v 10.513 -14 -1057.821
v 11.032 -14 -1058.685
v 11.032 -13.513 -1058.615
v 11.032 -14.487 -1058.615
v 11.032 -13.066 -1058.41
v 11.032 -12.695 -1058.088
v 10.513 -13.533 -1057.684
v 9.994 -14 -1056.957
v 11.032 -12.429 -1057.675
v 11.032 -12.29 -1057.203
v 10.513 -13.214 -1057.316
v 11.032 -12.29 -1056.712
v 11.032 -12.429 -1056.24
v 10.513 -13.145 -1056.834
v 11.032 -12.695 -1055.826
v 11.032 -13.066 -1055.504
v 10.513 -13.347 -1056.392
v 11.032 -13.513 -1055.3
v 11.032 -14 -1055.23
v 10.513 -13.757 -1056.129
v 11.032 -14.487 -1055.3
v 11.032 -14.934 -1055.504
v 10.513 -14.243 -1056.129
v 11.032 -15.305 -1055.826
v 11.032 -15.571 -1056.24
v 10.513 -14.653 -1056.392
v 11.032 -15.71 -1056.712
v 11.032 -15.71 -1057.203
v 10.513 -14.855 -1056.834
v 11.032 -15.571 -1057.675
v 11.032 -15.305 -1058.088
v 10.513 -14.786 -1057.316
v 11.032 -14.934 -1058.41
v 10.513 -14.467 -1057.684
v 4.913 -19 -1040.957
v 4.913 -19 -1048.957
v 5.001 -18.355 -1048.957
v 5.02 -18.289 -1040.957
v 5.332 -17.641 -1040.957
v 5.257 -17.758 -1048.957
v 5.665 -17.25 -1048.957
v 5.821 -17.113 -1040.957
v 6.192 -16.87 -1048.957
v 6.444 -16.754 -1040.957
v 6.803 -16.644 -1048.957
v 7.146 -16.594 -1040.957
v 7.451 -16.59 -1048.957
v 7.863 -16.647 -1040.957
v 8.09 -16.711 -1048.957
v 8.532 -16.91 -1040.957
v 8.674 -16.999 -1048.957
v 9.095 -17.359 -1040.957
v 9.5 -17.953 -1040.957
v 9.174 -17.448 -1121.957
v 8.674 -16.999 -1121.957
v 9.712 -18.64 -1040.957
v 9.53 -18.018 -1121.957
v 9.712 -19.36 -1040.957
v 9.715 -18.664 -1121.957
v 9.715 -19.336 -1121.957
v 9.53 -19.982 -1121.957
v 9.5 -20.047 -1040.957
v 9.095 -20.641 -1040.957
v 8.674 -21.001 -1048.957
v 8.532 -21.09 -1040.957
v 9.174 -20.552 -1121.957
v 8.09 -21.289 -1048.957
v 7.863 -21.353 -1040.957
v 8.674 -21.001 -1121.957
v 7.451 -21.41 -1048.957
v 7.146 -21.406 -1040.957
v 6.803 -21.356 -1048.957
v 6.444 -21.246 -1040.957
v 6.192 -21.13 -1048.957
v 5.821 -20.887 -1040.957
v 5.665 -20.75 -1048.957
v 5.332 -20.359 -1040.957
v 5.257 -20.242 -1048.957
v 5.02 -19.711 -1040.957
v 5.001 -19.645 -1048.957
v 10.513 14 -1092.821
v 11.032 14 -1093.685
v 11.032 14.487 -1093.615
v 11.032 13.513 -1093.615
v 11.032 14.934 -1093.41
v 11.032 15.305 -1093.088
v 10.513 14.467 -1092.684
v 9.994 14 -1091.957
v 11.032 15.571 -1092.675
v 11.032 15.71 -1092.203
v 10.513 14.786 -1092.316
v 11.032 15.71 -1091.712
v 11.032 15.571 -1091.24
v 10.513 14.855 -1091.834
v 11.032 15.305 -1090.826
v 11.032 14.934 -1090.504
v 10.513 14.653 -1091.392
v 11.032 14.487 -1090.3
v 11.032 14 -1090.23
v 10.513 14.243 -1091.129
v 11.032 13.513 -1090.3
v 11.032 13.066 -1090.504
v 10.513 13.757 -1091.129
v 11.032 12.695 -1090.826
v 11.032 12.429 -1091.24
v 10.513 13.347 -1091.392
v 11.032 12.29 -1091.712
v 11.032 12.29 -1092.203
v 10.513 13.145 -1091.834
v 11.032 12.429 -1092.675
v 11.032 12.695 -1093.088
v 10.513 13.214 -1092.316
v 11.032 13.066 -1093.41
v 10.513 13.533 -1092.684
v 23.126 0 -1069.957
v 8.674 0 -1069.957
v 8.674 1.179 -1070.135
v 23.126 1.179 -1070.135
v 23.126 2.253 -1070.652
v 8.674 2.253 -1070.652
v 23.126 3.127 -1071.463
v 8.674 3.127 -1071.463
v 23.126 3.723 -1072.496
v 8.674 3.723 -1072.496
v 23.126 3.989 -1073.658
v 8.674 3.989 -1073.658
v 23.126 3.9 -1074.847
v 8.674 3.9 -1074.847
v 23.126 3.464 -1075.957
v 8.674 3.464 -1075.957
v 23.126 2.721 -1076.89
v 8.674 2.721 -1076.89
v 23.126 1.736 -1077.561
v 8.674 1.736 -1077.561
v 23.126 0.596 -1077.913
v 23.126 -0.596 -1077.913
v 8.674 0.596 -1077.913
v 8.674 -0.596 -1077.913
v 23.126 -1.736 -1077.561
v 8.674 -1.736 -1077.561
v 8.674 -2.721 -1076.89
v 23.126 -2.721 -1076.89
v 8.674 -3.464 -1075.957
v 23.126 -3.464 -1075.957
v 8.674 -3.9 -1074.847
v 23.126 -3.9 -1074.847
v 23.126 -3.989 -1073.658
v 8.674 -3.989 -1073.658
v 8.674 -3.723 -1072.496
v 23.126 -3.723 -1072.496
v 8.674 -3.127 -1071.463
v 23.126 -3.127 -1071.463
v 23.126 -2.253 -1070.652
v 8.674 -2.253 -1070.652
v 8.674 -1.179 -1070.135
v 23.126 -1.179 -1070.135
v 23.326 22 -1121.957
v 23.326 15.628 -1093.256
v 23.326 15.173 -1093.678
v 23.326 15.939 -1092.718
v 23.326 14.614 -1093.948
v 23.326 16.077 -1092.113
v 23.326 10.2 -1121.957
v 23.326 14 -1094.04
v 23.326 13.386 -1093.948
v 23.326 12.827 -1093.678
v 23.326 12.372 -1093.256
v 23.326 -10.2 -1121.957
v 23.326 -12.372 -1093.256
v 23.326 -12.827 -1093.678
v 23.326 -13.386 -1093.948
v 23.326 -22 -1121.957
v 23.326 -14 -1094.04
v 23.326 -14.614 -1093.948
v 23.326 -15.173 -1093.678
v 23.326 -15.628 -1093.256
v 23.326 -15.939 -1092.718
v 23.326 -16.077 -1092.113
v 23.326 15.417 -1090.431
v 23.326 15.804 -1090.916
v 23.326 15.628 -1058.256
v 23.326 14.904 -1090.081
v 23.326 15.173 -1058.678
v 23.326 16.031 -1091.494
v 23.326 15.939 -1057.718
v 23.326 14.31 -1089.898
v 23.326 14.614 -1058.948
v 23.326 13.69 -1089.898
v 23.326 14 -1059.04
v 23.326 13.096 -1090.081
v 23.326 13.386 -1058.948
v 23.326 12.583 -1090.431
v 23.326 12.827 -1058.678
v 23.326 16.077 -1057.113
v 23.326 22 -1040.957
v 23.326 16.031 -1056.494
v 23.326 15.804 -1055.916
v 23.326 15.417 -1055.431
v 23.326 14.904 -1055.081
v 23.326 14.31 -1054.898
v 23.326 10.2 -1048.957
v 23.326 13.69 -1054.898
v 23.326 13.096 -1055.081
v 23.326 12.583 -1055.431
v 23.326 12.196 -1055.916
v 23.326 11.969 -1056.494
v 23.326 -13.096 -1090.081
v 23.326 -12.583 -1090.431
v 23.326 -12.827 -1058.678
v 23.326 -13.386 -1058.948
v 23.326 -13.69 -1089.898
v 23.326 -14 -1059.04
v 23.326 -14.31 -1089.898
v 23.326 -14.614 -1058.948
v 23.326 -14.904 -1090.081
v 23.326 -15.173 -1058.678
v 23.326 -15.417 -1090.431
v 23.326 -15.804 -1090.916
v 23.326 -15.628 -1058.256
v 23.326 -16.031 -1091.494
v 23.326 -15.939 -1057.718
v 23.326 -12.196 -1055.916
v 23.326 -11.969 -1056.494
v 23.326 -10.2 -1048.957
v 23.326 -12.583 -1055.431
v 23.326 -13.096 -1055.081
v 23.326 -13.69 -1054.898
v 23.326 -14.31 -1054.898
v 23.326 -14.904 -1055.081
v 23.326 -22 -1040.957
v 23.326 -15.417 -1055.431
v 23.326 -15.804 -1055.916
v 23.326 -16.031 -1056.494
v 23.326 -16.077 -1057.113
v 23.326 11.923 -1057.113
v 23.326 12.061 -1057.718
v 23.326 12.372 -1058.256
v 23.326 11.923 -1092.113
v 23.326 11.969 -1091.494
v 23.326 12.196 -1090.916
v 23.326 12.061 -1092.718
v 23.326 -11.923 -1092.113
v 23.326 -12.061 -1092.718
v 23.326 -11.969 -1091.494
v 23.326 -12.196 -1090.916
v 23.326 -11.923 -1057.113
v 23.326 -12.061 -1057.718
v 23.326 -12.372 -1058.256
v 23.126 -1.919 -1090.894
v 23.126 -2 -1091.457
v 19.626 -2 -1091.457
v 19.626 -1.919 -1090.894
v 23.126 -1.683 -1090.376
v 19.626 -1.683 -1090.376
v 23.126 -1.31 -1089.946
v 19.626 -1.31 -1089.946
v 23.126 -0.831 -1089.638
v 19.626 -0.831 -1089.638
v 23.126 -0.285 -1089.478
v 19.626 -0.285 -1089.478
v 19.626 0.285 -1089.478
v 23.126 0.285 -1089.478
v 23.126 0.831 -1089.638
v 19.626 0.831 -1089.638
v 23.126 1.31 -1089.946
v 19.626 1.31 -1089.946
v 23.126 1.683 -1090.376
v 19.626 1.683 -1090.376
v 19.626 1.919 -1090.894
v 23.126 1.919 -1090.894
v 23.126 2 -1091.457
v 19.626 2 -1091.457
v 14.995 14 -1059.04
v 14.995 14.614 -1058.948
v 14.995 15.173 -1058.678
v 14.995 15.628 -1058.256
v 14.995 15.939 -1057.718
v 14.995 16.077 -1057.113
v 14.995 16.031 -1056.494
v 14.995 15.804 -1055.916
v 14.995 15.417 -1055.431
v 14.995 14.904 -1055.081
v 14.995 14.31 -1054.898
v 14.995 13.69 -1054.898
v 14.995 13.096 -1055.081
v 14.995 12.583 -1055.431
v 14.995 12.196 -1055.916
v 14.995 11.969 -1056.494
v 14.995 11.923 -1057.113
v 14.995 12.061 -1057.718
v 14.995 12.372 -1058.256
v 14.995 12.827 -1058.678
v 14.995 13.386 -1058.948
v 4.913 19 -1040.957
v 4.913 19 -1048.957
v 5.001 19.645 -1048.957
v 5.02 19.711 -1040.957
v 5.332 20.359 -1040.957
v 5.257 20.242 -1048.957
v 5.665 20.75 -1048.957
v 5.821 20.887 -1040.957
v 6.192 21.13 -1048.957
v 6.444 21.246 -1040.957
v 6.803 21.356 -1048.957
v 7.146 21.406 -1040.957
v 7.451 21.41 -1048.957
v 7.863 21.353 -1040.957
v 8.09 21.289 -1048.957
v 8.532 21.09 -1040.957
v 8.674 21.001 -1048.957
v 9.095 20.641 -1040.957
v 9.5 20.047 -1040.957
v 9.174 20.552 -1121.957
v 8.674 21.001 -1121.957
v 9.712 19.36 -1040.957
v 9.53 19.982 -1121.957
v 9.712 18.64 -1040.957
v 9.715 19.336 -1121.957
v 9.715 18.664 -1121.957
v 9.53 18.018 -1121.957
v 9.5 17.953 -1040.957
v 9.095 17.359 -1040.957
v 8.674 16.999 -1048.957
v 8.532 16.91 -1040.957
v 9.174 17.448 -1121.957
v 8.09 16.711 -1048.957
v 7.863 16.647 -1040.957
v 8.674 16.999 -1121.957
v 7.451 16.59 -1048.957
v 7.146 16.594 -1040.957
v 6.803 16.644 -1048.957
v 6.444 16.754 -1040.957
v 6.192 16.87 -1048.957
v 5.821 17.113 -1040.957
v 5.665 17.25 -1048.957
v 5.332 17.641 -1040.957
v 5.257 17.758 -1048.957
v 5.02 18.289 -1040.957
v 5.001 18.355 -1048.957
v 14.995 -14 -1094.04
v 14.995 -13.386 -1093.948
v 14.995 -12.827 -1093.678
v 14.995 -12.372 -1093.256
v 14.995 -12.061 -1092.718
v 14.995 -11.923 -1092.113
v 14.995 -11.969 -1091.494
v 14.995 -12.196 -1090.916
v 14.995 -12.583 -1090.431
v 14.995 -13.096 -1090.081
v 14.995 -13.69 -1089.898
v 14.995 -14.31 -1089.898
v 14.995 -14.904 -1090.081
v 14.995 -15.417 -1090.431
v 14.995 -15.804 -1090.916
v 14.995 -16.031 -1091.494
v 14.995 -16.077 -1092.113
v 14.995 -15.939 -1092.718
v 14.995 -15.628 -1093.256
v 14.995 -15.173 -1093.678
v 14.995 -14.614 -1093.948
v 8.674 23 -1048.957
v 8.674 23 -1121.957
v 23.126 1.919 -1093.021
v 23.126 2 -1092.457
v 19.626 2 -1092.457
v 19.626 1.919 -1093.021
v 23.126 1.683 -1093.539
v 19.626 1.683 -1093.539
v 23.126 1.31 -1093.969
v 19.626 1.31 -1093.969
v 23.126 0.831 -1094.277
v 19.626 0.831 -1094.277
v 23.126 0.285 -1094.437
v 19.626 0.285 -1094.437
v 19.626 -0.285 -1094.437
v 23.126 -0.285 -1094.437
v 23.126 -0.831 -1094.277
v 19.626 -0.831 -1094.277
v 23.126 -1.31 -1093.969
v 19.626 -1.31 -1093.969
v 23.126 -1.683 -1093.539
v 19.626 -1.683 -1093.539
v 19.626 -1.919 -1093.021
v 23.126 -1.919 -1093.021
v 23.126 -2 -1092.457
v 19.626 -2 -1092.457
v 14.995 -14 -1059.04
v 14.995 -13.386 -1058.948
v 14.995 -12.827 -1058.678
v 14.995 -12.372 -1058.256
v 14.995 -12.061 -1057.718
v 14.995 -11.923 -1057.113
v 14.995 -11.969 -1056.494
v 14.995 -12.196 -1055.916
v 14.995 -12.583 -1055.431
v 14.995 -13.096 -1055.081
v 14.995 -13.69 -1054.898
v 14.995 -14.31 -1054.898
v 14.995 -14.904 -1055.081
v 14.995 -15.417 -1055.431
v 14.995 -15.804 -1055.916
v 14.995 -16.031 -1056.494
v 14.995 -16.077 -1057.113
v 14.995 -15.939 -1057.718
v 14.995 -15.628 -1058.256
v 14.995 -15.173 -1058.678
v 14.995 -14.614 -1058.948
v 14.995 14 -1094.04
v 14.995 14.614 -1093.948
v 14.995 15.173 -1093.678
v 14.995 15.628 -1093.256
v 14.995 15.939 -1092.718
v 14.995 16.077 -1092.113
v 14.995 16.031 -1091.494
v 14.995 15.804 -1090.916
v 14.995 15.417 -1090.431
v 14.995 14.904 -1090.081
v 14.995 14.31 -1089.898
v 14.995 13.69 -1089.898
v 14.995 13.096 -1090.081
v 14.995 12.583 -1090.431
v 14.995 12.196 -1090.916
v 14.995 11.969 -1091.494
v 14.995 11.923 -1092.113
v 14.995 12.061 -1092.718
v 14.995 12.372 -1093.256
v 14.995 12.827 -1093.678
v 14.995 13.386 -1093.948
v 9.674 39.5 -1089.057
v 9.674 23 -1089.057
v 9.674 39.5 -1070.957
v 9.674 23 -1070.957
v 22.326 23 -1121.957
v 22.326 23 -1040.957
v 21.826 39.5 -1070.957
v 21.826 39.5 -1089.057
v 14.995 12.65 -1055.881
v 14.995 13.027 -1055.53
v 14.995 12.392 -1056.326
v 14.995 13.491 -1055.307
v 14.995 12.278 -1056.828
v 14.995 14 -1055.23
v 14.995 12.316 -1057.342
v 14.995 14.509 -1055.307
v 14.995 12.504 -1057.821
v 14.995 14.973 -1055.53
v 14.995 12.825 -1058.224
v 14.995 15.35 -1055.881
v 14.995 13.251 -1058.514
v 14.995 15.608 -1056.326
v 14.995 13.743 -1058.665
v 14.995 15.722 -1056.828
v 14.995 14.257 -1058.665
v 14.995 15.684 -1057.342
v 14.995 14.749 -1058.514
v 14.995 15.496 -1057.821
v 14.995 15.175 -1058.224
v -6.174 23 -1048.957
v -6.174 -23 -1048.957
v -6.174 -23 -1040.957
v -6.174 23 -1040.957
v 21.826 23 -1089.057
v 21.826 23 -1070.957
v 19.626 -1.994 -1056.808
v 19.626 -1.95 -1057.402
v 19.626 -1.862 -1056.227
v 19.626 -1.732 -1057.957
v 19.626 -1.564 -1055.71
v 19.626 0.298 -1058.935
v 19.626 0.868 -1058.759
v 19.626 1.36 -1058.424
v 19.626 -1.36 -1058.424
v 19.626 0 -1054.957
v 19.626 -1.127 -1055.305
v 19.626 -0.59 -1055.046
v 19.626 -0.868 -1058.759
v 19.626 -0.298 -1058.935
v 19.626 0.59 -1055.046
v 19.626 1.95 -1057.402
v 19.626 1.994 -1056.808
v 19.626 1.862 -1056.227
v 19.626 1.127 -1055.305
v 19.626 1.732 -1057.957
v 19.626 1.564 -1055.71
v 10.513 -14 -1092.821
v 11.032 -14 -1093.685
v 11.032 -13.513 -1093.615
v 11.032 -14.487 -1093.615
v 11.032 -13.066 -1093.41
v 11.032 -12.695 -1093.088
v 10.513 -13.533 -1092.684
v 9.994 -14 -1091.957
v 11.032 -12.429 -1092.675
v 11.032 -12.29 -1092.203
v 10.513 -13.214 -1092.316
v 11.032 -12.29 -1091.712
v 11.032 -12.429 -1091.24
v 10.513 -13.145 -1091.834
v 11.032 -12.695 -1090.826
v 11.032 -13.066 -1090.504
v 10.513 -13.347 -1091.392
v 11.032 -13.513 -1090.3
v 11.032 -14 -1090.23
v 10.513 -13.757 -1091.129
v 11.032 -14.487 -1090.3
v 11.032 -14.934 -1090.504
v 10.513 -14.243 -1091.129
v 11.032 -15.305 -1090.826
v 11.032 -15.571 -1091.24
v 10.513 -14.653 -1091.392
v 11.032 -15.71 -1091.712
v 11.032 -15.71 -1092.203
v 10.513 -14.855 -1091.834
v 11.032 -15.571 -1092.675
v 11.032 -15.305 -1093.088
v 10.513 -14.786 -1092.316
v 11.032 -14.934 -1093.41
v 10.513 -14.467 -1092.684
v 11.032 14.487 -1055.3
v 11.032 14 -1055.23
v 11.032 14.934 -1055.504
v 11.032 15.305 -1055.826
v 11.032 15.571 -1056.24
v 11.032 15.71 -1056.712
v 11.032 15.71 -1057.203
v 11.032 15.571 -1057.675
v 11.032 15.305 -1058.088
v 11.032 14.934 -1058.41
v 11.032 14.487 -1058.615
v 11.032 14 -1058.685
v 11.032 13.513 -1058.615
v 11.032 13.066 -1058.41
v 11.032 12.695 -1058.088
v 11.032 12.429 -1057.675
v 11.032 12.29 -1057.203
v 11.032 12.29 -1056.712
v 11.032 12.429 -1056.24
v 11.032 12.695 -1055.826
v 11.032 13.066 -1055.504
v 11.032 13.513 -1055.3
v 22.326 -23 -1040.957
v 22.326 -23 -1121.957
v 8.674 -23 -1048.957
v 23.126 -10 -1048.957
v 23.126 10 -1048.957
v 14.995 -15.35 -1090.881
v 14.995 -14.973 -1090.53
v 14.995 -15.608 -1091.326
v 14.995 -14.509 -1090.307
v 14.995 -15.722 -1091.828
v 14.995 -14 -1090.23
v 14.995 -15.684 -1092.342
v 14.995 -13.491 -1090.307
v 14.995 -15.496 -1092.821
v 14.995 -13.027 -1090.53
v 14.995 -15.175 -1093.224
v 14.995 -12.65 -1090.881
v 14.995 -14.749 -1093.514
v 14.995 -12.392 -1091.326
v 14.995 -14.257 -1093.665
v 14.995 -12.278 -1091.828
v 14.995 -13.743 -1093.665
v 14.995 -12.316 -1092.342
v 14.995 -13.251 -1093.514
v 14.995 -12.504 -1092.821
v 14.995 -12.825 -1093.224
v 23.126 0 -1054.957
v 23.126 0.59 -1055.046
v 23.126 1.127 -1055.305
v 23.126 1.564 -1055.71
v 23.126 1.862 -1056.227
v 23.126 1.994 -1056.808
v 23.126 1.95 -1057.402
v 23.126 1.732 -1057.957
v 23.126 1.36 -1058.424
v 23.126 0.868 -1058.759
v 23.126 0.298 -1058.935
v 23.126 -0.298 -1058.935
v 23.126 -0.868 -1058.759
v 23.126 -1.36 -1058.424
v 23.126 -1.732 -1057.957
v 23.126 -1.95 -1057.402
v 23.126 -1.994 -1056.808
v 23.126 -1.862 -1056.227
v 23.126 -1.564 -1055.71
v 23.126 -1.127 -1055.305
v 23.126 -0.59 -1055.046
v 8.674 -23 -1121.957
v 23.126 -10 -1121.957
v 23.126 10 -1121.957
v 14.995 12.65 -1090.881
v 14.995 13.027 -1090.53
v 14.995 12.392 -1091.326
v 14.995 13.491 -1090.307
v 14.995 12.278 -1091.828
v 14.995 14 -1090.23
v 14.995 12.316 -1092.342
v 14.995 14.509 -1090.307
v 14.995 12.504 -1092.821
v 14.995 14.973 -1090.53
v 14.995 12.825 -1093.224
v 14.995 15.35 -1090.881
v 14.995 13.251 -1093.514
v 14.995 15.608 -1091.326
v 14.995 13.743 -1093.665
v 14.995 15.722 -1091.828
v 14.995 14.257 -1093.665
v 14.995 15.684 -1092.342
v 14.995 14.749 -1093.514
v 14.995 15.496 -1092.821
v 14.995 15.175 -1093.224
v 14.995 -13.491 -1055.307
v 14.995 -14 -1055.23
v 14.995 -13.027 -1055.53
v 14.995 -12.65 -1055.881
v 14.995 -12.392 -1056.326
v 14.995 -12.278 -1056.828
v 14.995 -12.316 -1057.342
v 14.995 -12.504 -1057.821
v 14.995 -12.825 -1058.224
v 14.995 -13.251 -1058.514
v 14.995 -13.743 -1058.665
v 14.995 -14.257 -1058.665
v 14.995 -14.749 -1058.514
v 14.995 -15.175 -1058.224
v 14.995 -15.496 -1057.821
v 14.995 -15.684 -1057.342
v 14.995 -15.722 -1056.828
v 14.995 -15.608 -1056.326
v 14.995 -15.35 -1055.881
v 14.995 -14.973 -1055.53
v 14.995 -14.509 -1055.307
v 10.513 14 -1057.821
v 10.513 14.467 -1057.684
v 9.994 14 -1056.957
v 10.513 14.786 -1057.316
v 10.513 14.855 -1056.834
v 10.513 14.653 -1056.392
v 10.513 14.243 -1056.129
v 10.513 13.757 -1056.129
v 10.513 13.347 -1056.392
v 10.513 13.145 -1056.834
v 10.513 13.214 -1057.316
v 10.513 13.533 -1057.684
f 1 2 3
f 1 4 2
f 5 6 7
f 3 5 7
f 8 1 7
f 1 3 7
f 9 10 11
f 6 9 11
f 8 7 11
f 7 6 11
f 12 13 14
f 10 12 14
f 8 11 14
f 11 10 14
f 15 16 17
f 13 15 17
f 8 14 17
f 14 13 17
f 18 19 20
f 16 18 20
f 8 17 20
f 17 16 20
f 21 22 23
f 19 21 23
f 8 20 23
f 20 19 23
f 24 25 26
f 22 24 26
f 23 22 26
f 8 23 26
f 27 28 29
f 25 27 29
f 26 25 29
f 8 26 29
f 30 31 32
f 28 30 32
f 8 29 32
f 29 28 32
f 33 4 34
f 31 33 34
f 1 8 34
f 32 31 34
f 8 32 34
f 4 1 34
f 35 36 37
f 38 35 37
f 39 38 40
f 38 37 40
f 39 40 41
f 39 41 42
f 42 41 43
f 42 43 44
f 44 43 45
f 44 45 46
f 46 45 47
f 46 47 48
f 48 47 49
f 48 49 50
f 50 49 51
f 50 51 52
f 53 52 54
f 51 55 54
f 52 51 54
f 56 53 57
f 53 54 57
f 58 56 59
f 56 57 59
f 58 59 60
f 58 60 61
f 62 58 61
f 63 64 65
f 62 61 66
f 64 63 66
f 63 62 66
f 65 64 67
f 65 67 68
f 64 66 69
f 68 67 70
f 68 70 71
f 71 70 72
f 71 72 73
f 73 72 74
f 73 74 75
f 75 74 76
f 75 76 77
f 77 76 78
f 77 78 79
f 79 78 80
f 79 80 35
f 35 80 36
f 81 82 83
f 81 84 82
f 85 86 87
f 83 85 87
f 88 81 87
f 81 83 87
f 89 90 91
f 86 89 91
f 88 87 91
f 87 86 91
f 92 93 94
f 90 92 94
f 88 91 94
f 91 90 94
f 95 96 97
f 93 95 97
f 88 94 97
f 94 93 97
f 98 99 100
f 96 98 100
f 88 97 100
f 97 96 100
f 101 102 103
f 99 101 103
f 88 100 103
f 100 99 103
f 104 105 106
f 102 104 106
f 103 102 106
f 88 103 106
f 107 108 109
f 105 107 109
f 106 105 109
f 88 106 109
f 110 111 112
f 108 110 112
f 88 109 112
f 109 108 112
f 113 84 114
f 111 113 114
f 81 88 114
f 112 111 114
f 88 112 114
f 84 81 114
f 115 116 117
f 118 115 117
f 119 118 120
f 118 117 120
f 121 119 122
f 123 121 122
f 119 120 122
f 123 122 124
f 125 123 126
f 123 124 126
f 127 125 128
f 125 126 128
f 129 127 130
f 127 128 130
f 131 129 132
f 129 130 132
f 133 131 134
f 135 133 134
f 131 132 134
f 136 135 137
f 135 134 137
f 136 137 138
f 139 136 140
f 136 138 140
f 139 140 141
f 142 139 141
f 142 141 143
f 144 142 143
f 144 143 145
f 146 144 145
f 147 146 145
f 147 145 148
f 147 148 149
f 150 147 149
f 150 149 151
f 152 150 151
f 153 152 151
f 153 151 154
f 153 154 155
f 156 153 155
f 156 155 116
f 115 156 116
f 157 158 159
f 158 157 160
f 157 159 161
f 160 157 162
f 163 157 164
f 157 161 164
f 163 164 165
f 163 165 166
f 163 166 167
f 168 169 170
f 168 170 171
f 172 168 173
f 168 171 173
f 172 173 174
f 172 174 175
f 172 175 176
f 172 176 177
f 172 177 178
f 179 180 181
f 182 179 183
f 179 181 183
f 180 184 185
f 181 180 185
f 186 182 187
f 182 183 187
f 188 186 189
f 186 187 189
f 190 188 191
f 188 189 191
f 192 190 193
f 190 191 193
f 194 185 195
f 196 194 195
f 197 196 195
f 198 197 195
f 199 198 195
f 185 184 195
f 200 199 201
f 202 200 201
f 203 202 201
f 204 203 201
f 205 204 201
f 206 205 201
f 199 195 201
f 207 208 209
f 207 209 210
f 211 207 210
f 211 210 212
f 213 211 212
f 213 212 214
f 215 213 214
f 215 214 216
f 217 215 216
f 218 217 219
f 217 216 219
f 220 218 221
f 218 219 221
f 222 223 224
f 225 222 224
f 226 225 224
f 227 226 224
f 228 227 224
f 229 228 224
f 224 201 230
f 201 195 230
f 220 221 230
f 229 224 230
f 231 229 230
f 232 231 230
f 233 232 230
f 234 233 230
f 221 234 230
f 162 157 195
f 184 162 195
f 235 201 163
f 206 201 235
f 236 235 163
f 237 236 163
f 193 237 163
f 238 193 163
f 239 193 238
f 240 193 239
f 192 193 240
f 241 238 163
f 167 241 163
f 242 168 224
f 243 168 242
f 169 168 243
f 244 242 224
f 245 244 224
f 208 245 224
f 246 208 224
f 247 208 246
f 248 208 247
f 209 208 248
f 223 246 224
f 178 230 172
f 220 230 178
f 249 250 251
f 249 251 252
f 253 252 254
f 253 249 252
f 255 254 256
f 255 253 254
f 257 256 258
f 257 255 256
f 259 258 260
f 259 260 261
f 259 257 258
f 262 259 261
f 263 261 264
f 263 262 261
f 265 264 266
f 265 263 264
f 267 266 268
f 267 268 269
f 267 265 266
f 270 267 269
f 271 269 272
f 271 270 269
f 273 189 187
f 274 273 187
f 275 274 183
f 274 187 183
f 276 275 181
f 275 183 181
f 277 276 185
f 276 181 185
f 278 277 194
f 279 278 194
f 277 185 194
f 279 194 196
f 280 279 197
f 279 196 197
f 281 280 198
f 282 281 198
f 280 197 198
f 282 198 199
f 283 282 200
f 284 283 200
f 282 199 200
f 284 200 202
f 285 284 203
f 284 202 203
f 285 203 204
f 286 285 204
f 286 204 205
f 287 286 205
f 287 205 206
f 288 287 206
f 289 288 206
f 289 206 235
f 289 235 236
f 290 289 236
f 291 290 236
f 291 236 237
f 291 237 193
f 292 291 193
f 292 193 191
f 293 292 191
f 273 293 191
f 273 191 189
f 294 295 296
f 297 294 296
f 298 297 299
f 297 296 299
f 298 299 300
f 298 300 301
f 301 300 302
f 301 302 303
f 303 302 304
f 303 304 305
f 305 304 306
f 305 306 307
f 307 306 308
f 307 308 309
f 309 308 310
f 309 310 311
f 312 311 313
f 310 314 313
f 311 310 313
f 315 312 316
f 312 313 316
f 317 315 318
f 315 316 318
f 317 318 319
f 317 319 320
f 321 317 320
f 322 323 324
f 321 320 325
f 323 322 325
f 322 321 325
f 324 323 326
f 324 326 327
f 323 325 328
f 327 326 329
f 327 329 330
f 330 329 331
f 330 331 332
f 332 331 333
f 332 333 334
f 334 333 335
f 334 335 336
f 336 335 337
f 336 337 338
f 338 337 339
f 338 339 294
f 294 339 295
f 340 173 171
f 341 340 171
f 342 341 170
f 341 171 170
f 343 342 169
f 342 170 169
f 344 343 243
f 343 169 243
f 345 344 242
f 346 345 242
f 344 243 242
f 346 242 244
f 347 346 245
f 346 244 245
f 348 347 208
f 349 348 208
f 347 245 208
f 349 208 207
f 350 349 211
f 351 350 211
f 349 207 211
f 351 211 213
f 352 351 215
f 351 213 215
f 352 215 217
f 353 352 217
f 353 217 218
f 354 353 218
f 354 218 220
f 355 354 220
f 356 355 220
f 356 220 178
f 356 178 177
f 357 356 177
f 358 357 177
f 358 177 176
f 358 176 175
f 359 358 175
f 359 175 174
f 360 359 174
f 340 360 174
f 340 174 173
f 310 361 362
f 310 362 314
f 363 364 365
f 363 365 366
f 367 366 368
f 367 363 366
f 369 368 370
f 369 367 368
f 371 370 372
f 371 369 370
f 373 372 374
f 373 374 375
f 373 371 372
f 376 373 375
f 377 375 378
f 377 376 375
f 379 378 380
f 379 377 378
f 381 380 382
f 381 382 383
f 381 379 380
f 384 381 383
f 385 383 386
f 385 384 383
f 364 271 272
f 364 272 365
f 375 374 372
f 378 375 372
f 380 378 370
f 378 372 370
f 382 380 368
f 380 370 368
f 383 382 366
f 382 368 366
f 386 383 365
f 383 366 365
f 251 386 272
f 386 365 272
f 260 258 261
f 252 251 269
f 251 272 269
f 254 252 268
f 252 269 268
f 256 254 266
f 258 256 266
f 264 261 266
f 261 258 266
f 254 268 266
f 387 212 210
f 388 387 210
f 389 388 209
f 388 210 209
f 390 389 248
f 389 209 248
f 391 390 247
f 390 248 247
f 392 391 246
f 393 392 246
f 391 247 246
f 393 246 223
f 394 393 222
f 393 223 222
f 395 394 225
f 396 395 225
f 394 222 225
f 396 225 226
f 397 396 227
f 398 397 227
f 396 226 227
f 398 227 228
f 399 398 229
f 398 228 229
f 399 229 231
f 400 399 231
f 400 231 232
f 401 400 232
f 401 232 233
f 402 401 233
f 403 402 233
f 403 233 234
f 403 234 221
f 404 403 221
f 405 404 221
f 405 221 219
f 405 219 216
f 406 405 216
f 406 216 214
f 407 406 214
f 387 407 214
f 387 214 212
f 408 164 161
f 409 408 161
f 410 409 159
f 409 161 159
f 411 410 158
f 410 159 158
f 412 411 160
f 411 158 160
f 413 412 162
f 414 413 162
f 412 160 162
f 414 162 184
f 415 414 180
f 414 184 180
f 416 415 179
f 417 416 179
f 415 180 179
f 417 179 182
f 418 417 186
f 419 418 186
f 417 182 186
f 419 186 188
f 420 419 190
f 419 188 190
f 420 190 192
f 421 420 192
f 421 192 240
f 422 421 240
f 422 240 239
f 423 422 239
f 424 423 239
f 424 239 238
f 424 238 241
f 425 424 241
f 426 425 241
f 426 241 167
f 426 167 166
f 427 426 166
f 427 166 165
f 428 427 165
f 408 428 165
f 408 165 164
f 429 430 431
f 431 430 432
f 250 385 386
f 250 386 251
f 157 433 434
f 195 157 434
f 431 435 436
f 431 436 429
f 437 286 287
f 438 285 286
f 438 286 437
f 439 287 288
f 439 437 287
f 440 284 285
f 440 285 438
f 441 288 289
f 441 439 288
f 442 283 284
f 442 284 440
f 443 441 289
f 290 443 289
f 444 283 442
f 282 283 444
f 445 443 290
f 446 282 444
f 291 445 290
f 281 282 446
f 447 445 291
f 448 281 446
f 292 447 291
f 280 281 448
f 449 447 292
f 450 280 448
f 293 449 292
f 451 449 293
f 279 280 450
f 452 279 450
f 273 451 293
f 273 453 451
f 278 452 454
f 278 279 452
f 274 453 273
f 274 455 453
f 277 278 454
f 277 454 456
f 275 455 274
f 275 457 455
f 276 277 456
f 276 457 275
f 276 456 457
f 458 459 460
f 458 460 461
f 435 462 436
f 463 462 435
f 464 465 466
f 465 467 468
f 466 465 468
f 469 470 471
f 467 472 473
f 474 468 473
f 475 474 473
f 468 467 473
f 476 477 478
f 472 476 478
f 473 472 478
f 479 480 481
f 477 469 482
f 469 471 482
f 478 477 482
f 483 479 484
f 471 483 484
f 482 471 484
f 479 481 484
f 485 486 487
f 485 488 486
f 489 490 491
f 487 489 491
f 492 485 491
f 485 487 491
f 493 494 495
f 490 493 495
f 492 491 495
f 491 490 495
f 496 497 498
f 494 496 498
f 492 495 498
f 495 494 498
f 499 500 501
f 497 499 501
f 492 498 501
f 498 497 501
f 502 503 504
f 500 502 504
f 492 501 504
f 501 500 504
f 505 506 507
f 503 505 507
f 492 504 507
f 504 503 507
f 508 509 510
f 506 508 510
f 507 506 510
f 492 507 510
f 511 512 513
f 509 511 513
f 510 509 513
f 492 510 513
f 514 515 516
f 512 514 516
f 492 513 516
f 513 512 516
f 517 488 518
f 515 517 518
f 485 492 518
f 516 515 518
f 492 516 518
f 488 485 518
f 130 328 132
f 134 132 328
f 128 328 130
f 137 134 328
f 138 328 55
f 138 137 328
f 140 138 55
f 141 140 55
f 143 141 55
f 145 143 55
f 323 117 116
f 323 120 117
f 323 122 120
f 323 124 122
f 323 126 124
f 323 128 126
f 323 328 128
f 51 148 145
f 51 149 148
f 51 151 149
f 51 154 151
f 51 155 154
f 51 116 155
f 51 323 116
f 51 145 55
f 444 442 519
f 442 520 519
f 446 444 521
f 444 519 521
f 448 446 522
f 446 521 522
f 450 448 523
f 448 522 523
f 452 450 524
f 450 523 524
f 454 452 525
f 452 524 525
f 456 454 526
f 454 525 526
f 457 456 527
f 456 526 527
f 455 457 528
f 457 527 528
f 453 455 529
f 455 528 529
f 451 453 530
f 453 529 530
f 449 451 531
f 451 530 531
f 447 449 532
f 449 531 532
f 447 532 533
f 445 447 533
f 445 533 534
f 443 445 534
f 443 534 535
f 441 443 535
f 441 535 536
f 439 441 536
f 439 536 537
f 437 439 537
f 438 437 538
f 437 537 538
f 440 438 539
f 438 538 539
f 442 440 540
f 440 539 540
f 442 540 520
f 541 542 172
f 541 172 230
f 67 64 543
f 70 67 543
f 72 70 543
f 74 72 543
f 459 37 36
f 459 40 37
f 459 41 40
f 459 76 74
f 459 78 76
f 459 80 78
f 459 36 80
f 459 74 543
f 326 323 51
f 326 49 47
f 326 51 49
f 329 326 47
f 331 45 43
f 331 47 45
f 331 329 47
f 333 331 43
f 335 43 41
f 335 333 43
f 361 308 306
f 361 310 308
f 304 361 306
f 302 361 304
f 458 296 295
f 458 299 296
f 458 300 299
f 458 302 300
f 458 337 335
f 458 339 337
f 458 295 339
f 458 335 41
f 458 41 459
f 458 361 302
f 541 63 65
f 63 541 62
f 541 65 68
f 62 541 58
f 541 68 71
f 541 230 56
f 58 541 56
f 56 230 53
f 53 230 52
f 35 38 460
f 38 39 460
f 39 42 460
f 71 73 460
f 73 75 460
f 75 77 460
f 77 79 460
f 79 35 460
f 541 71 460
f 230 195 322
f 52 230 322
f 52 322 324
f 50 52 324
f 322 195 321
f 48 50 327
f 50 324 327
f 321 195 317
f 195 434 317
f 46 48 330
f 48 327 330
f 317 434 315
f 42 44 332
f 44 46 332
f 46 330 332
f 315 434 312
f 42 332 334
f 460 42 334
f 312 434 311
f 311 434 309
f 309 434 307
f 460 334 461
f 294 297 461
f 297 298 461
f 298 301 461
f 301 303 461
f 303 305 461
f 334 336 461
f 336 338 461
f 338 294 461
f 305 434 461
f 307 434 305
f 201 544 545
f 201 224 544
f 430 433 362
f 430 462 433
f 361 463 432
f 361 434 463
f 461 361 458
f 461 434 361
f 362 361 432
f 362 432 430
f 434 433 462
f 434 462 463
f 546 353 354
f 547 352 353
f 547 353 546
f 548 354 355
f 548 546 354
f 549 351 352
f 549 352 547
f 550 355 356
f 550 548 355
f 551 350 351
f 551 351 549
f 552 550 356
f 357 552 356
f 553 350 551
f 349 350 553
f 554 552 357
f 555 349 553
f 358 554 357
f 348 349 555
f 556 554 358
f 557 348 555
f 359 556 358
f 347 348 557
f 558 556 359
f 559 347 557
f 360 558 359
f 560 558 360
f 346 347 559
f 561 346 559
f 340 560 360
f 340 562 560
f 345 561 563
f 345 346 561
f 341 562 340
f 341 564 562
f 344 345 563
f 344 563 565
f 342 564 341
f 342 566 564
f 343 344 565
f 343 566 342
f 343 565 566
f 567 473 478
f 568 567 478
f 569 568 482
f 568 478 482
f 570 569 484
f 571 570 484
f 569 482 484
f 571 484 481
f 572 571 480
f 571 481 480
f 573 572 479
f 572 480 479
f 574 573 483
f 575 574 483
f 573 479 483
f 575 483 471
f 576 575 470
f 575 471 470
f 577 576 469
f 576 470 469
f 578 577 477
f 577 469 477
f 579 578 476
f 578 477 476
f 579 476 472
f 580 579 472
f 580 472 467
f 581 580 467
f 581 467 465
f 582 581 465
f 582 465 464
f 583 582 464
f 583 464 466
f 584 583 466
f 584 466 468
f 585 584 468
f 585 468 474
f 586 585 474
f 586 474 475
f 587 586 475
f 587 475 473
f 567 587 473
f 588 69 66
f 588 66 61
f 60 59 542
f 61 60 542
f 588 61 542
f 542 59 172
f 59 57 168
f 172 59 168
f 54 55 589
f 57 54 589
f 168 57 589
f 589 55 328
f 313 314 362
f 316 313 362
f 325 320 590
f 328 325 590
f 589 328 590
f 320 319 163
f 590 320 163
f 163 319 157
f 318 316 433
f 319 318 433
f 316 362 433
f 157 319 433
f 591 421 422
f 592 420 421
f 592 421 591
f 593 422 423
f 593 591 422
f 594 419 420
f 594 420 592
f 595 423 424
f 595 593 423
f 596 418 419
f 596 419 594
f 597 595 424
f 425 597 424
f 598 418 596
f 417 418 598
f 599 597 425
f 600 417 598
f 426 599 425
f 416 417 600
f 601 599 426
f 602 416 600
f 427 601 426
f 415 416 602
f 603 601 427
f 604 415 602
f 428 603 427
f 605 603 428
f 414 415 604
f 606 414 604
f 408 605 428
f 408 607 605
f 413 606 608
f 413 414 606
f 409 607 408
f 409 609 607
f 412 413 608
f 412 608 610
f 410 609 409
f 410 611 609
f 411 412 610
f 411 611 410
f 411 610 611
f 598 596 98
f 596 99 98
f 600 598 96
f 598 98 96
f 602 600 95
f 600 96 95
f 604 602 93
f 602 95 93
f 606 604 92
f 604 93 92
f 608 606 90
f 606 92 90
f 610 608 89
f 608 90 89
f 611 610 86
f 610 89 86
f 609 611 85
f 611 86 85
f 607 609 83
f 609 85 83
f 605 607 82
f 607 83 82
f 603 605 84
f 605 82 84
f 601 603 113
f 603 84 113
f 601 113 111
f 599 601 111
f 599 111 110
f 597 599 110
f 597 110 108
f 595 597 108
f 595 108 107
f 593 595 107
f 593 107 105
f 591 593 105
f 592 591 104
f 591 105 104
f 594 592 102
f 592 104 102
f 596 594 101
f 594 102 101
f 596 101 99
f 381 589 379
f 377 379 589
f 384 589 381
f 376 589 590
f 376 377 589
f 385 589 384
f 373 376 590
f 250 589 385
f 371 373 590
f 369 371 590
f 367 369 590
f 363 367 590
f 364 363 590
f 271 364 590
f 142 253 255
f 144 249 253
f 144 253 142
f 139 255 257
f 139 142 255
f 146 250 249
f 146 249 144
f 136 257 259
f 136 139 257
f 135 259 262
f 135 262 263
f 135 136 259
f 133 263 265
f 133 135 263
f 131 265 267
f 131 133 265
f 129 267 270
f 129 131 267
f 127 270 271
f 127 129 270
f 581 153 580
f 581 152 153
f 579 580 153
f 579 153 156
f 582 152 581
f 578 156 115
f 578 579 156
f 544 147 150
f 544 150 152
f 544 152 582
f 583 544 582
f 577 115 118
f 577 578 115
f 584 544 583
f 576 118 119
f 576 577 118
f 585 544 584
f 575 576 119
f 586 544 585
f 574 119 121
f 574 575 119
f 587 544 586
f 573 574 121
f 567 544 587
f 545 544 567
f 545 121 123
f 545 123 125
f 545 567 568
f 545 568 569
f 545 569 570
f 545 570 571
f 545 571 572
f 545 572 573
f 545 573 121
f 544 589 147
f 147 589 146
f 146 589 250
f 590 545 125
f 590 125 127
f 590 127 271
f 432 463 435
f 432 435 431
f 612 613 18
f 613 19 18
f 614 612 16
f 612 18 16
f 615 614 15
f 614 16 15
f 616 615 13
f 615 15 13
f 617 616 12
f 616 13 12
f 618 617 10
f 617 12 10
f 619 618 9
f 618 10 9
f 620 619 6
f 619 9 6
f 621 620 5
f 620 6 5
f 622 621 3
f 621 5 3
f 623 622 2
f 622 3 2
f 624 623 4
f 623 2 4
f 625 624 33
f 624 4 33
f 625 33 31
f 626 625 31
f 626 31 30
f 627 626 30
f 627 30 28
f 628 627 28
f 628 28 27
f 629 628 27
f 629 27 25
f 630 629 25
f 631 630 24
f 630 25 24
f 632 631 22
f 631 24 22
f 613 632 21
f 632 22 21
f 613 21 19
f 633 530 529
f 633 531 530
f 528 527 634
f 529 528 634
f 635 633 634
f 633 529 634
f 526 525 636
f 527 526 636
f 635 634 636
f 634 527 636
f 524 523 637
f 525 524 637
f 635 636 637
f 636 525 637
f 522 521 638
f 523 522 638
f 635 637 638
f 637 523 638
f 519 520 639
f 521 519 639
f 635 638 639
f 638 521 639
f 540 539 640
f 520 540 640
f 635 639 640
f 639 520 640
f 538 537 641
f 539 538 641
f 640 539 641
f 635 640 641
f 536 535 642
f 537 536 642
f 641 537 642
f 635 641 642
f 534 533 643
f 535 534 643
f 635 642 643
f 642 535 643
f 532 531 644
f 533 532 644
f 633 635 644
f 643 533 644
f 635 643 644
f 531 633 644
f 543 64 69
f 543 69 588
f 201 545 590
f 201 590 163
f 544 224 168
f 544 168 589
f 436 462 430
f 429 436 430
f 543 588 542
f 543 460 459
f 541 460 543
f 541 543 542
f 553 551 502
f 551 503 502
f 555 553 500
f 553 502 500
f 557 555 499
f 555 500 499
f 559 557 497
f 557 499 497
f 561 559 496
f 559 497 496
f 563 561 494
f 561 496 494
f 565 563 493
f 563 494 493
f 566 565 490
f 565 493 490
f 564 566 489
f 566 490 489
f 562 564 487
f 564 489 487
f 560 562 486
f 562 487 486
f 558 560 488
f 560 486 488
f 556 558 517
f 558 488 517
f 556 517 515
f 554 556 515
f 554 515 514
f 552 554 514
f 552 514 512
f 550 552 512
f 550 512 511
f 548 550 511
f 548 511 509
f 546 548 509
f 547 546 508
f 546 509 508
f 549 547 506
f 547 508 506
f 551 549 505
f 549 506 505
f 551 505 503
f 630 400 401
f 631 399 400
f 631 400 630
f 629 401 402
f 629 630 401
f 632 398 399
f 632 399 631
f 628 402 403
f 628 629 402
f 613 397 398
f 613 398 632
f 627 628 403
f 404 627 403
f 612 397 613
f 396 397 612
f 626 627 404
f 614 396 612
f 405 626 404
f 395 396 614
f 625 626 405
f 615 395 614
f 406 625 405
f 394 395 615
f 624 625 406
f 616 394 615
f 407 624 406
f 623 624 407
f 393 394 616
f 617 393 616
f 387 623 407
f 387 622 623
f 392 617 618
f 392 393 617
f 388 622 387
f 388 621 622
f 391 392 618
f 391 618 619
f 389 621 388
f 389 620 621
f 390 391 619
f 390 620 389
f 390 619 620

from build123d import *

# Parameters (mm, degrees)
BASE_EXTRUDE_DEPTH              = 8
BOSS_EXTRUDE1_DEPTH             = 73
BOSS_EXTRUDE3_DEPTH             = 8
F_8_0_DIAMETER_HOLE1_D          = 8
F_8_32_TAPPED_HOLE1_D           = 3.4544
F_8_32_TAPPED_HOLE1_DEPTH       = 12.2936
F_8_32_TAPPED_HOLE1_CBORE_D     = 4.1656
F_8_32_TAPPED_HOLE1_CBORE_DEPTH = 8.3312
F_8_32_TAPPED_HOLE1_TIP         = 1.037806461
F_10_32_TAPPED_HOLE1_D          = 4.826
CUT_EXTRUDE1_DEPTH              = 3.5
HOLE1_D                         = 4
HOLE1_DEPTH                     = 3.5
SKETCH14_W                      = 12.1518
SKETCH14_H                      = 18.1
BOSS_EXTRUDE2_DEPTH             = 16.5
CHAMFER1_SIZE                   = 1


with BuildPart() as part:
    # Sketch1 → Base-Extrude (new body)
    with BuildSketch(Plane.XY.offset(-1048.957398403)):
        Polygon((-6.1741, 23), (23.3259, 23), (23.3259, 10.2), (23.1259, 10), (23.1259, -10), (23.3259, -10.2), (23.3259, -23), (-6.1741, -23), align=None)
    extrude(amount=BASE_EXTRUDE_DEPTH)

    # Sketch3 → Boss-Extrude1 (add)
    with BuildSketch(Plane(origin=(0, 0, -1048.957398403), x_dir=(-1, 0, 0), z_dir=(0, 0, -1))):
        Polygon((-23.3259, 10.2), (-23.3259, 23), (-8.6741, 23), (-8.6741, -23), (-23.3259, -23), (-23.3259, -10.2), (-23.1259, -10), (-23.1259, 10), align=None)
    extrude(amount=BOSS_EXTRUDE1_DEPTH)

    # Sketch15 → Boss-Extrude3 (add)
    with BuildSketch(Plane.XY.offset(-1040.957398403)):
        Polygon((23.1259, -10), (23.1259, 10), (23.3259, 10.2), (23.3259, -10.2), align=None)
    extrude(amount=-BOSS_EXTRUDE3_DEPTH)

    # 8.0 Diameter Hole1 (through all)
    with Locations(Plane(origin=(23.1259, 0, 0), x_dir=(0, 0, -1), z_dir=(1, 0, 0))):
        with Locations((1073.957398403, 0)):
            Hole(F_8_0_DIAMETER_HOLE1_D / 2)

    # #8-32 Tapped Hole1
    with Locations(Plane(origin=(23.3259, 0, 0), x_dir=(0, 0, -1), z_dir=(1, 0, 0))):
        with Locations((1056.957398403, 14), (1091.957398403, 14), (1056.957398403, -14), (1091.957398403, -14)):
            CounterBoreHole(F_8_32_TAPPED_HOLE1_D / 2, F_8_32_TAPPED_HOLE1_CBORE_D / 2, F_8_32_TAPPED_HOLE1_CBORE_DEPTH, depth=F_8_32_TAPPED_HOLE1_DEPTH)
            with Locations((0, 0, -(F_8_32_TAPPED_HOLE1_DEPTH + F_8_32_TAPPED_HOLE1_TIP / 2))):  # 118° drill point
                Cone(0, F_8_32_TAPPED_HOLE1_D / 2, F_8_32_TAPPED_HOLE1_TIP, mode=Mode.SUBTRACT)

    # #10-32 Tapped Hole1 (through all)
    with Locations(Plane.XY.offset(-1040.957398403)):
        with Locations((7.3259, 19), (7.3259, -19)):
            Hole(F_10_32_TAPPED_HOLE1_D / 2)

    # Sketch11 → Cut-Extrude1 (cut)
    with BuildSketch(Plane(origin=(23.1259, 0, 0), x_dir=(0, 0, -1), z_dir=(1, 0, 0))):
        with BuildLine():
            Line((1091.457398403, 2), (1092.457398403, 2))
            ThreePointArc((1092.457398403, 2), (1094.457398403, 0), (1092.457398403, -2))
            Line((1092.457398403, -2), (1091.457398403, -2))
            ThreePointArc((1091.457398403, -2), (1089.457398403, 0), (1091.457398403, 2))
        make_face()
    extrude(amount=-CUT_EXTRUDE1_DEPTH, mode=Mode.SUBTRACT)

    # Hole1
    with Locations(Plane(origin=(23.1259, 0, 0), x_dir=(0, 0, -1), z_dir=(1, 0, 0))):
        with Locations((1056.957398403, 0)):
            Hole(HOLE1_D / 2, depth=HOLE1_DEPTH)

    # Sketch14 → Boss-Extrude2 (add)
    with BuildSketch(Plane(origin=(0, 23, 0), x_dir=(-1, 0, 0), z_dir=(0, 1, 0))):
        with Locations((-15.75, -1080.007398403)):
            Rectangle(SKETCH14_W, SKETCH14_H)
    extrude(amount=BOSS_EXTRUDE2_DEPTH)

    # Chamfer1
    chamfer1_edges = [part.edges().sort_by_distance(p)[0] for p in [
        (23.3259, -23, -1081.457398403),
        (23.3259, 23, -1081.457398403),
    ]]
    chamfer(chamfer1_edges, length=CHAMFER1_SIZE)


solid = part.part
